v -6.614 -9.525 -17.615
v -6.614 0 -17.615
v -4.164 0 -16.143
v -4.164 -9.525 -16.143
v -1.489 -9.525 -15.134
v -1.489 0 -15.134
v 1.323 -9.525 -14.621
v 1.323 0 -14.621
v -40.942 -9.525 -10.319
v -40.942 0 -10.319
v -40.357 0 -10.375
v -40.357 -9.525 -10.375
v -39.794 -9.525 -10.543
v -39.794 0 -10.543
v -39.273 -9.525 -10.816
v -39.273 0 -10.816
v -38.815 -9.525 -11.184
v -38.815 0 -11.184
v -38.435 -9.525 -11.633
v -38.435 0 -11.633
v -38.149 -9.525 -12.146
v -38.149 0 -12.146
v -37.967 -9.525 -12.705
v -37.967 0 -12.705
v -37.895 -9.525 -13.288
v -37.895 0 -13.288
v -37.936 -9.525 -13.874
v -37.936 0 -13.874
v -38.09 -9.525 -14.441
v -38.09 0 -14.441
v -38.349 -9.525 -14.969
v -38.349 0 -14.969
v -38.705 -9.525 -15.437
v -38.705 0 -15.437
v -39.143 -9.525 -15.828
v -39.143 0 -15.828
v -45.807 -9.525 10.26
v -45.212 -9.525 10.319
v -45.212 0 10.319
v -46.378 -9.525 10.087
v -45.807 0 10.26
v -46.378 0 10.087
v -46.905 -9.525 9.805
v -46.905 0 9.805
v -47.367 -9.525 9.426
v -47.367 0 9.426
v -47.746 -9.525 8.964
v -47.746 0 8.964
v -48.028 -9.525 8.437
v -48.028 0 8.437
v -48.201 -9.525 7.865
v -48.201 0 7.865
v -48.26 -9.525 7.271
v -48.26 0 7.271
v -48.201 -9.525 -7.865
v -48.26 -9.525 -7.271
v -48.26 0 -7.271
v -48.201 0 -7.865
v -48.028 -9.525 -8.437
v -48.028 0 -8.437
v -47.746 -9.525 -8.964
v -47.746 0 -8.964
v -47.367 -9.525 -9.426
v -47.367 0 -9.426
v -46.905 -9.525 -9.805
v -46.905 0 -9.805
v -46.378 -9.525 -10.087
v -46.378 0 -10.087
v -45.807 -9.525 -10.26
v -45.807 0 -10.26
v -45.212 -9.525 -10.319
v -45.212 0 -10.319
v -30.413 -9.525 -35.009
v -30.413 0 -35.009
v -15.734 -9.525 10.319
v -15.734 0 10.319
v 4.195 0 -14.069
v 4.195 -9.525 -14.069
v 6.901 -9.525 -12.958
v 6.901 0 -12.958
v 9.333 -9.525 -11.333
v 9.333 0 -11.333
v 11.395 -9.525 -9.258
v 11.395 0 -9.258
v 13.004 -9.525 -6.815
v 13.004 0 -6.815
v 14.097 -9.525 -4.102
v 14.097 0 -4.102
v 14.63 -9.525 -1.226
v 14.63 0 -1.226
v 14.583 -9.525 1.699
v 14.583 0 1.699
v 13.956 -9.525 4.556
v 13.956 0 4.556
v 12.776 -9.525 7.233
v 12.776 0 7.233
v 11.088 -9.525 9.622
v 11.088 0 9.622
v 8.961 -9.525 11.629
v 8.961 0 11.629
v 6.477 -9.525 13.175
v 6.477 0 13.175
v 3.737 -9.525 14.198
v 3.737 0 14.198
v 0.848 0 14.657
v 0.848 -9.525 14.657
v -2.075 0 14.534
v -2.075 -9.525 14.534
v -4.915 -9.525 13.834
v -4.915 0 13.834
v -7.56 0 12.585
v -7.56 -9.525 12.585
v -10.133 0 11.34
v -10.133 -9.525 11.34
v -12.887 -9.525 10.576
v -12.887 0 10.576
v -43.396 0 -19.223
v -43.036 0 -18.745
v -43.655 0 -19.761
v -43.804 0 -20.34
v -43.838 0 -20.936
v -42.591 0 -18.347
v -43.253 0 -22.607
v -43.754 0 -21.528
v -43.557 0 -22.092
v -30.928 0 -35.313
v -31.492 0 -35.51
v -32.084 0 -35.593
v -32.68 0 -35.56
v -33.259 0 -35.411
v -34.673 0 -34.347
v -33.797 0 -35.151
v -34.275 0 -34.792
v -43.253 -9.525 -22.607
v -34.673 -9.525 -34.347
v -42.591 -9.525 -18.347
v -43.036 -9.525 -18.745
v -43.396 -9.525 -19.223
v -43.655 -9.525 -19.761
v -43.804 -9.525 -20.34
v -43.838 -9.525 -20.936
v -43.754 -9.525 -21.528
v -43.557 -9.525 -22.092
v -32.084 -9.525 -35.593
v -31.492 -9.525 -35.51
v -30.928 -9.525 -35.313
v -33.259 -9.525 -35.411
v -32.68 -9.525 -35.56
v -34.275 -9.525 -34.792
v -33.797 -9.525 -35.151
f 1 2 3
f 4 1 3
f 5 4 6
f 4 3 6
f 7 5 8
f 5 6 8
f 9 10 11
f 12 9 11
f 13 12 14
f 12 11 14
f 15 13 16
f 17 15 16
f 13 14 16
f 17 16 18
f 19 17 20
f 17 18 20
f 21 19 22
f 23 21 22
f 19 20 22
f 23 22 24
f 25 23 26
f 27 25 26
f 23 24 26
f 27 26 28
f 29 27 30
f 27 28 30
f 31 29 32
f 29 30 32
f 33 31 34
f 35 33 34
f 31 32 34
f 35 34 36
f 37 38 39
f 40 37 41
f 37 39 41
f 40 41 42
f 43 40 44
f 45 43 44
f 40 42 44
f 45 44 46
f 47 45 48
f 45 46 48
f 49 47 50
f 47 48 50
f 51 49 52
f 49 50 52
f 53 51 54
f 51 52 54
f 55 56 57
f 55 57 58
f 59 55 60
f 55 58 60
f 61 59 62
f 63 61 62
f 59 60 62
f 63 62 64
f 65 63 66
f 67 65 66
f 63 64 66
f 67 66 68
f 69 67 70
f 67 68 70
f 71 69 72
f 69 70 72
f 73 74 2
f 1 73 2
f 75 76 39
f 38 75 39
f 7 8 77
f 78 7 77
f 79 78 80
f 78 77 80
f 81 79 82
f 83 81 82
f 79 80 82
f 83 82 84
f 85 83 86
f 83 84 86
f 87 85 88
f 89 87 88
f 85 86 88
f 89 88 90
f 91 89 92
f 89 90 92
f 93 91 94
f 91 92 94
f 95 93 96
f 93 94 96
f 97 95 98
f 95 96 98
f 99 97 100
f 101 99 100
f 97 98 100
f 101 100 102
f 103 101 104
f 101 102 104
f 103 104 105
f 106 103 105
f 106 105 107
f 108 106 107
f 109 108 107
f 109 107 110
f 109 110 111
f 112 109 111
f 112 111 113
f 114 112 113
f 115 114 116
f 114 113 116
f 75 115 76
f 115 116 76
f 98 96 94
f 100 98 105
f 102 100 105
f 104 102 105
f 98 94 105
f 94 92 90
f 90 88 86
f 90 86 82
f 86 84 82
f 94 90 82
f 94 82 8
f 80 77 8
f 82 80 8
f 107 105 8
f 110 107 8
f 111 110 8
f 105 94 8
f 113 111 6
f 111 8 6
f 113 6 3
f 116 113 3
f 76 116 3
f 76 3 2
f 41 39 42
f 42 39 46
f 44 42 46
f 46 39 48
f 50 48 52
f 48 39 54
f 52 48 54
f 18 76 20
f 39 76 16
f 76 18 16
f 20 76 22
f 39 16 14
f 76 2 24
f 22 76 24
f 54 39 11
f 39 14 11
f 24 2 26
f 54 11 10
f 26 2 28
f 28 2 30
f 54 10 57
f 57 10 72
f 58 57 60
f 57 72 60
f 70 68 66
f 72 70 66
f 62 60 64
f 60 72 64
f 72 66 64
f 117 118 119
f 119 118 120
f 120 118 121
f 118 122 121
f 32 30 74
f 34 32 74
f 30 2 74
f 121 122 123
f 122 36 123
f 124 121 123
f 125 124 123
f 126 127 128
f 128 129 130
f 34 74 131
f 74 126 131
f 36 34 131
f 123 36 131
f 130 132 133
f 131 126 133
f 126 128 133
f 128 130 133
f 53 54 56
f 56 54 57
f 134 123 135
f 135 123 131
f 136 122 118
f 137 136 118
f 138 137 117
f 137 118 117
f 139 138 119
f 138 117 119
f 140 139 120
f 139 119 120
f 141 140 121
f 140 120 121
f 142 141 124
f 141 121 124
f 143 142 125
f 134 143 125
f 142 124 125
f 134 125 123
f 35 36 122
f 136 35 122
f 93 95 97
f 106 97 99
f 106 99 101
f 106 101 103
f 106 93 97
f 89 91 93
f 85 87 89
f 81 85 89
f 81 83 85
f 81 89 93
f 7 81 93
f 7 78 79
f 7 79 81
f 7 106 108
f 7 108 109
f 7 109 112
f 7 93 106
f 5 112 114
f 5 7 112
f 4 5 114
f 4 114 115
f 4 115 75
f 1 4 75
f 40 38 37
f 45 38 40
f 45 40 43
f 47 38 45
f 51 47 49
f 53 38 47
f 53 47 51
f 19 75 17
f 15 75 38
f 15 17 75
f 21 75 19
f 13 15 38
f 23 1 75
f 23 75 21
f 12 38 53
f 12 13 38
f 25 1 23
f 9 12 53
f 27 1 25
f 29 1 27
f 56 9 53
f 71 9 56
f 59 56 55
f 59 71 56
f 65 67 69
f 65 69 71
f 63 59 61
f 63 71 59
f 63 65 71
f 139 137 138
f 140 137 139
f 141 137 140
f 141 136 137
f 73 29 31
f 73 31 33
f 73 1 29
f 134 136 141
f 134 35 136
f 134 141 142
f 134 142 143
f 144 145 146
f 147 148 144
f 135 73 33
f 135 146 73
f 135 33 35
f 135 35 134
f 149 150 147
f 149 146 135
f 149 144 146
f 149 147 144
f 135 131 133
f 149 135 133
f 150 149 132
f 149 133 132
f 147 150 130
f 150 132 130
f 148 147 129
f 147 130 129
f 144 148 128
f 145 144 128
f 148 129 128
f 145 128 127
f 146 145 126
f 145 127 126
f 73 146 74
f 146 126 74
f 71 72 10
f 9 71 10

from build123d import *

# Parameters (mm, degrees)
BOSS_EXTRUDE1_DEPTH = 9.525


with BuildPart() as part:
    # Sketch1 → Boss-Extrude1 (new body)
    with BuildSketch(Plane(origin=(0, 0, 0), x_dir=(1, 0, 0), z_dir=(0, 1, 0))):
        with BuildLine():
            Line((-43.253160589, 22.606536767), (-34.672708234, 34.346684109))
            ThreePointArc((-34.672708234, 34.346684109), (-32.680204005, 35.559969312), (-30.413368559, 35.008978255))
            Line((-30.413368559, 35.008978255), (-6.614426983, 17.615185966))
            ThreePointArc((-6.614426983, 17.615185966), (-2.849545496, 15.578373329), (1.322663433, 14.621497696))
            ThreePointArc((1.322663433, 14.621497696), (13.956234084, -4.556441994), (-7.559797873, -12.585193267))
            ThreePointArc((-7.559797873, -12.585193267), (-11.492870345, -10.89585042), (-15.734319794, -10.31875))
            Line((-15.734319794, -10.31875), (-45.212, -10.31875))
            ThreePointArc((-45.212, -10.31875), (-47.367261469, -9.426011469), (-48.26, -7.27075))
            Line((-48.26, -7.27075), (-48.26, 7.27075))
            ThreePointArc((-48.26, 7.27075), (-47.367261469, 9.426011469), (-45.212, 10.31875))
            Line((-45.212, 10.31875), (-40.94192183, 10.31875))
            ThreePointArc((-40.94192183, 10.31875), (-38.044433785, 12.420775884), (-39.143399065, 15.82756691))
            Line((-39.143399065, 15.82756691), (-42.590866444, 18.347197092))
            ThreePointArc((-42.590866444, 18.347197092), (-43.804151646, 20.339701321), (-43.253160589, 22.606536767))
        make_face()
    extrude(amount=-BOSS_EXTRUDE1_DEPTH)


solid = part.part
